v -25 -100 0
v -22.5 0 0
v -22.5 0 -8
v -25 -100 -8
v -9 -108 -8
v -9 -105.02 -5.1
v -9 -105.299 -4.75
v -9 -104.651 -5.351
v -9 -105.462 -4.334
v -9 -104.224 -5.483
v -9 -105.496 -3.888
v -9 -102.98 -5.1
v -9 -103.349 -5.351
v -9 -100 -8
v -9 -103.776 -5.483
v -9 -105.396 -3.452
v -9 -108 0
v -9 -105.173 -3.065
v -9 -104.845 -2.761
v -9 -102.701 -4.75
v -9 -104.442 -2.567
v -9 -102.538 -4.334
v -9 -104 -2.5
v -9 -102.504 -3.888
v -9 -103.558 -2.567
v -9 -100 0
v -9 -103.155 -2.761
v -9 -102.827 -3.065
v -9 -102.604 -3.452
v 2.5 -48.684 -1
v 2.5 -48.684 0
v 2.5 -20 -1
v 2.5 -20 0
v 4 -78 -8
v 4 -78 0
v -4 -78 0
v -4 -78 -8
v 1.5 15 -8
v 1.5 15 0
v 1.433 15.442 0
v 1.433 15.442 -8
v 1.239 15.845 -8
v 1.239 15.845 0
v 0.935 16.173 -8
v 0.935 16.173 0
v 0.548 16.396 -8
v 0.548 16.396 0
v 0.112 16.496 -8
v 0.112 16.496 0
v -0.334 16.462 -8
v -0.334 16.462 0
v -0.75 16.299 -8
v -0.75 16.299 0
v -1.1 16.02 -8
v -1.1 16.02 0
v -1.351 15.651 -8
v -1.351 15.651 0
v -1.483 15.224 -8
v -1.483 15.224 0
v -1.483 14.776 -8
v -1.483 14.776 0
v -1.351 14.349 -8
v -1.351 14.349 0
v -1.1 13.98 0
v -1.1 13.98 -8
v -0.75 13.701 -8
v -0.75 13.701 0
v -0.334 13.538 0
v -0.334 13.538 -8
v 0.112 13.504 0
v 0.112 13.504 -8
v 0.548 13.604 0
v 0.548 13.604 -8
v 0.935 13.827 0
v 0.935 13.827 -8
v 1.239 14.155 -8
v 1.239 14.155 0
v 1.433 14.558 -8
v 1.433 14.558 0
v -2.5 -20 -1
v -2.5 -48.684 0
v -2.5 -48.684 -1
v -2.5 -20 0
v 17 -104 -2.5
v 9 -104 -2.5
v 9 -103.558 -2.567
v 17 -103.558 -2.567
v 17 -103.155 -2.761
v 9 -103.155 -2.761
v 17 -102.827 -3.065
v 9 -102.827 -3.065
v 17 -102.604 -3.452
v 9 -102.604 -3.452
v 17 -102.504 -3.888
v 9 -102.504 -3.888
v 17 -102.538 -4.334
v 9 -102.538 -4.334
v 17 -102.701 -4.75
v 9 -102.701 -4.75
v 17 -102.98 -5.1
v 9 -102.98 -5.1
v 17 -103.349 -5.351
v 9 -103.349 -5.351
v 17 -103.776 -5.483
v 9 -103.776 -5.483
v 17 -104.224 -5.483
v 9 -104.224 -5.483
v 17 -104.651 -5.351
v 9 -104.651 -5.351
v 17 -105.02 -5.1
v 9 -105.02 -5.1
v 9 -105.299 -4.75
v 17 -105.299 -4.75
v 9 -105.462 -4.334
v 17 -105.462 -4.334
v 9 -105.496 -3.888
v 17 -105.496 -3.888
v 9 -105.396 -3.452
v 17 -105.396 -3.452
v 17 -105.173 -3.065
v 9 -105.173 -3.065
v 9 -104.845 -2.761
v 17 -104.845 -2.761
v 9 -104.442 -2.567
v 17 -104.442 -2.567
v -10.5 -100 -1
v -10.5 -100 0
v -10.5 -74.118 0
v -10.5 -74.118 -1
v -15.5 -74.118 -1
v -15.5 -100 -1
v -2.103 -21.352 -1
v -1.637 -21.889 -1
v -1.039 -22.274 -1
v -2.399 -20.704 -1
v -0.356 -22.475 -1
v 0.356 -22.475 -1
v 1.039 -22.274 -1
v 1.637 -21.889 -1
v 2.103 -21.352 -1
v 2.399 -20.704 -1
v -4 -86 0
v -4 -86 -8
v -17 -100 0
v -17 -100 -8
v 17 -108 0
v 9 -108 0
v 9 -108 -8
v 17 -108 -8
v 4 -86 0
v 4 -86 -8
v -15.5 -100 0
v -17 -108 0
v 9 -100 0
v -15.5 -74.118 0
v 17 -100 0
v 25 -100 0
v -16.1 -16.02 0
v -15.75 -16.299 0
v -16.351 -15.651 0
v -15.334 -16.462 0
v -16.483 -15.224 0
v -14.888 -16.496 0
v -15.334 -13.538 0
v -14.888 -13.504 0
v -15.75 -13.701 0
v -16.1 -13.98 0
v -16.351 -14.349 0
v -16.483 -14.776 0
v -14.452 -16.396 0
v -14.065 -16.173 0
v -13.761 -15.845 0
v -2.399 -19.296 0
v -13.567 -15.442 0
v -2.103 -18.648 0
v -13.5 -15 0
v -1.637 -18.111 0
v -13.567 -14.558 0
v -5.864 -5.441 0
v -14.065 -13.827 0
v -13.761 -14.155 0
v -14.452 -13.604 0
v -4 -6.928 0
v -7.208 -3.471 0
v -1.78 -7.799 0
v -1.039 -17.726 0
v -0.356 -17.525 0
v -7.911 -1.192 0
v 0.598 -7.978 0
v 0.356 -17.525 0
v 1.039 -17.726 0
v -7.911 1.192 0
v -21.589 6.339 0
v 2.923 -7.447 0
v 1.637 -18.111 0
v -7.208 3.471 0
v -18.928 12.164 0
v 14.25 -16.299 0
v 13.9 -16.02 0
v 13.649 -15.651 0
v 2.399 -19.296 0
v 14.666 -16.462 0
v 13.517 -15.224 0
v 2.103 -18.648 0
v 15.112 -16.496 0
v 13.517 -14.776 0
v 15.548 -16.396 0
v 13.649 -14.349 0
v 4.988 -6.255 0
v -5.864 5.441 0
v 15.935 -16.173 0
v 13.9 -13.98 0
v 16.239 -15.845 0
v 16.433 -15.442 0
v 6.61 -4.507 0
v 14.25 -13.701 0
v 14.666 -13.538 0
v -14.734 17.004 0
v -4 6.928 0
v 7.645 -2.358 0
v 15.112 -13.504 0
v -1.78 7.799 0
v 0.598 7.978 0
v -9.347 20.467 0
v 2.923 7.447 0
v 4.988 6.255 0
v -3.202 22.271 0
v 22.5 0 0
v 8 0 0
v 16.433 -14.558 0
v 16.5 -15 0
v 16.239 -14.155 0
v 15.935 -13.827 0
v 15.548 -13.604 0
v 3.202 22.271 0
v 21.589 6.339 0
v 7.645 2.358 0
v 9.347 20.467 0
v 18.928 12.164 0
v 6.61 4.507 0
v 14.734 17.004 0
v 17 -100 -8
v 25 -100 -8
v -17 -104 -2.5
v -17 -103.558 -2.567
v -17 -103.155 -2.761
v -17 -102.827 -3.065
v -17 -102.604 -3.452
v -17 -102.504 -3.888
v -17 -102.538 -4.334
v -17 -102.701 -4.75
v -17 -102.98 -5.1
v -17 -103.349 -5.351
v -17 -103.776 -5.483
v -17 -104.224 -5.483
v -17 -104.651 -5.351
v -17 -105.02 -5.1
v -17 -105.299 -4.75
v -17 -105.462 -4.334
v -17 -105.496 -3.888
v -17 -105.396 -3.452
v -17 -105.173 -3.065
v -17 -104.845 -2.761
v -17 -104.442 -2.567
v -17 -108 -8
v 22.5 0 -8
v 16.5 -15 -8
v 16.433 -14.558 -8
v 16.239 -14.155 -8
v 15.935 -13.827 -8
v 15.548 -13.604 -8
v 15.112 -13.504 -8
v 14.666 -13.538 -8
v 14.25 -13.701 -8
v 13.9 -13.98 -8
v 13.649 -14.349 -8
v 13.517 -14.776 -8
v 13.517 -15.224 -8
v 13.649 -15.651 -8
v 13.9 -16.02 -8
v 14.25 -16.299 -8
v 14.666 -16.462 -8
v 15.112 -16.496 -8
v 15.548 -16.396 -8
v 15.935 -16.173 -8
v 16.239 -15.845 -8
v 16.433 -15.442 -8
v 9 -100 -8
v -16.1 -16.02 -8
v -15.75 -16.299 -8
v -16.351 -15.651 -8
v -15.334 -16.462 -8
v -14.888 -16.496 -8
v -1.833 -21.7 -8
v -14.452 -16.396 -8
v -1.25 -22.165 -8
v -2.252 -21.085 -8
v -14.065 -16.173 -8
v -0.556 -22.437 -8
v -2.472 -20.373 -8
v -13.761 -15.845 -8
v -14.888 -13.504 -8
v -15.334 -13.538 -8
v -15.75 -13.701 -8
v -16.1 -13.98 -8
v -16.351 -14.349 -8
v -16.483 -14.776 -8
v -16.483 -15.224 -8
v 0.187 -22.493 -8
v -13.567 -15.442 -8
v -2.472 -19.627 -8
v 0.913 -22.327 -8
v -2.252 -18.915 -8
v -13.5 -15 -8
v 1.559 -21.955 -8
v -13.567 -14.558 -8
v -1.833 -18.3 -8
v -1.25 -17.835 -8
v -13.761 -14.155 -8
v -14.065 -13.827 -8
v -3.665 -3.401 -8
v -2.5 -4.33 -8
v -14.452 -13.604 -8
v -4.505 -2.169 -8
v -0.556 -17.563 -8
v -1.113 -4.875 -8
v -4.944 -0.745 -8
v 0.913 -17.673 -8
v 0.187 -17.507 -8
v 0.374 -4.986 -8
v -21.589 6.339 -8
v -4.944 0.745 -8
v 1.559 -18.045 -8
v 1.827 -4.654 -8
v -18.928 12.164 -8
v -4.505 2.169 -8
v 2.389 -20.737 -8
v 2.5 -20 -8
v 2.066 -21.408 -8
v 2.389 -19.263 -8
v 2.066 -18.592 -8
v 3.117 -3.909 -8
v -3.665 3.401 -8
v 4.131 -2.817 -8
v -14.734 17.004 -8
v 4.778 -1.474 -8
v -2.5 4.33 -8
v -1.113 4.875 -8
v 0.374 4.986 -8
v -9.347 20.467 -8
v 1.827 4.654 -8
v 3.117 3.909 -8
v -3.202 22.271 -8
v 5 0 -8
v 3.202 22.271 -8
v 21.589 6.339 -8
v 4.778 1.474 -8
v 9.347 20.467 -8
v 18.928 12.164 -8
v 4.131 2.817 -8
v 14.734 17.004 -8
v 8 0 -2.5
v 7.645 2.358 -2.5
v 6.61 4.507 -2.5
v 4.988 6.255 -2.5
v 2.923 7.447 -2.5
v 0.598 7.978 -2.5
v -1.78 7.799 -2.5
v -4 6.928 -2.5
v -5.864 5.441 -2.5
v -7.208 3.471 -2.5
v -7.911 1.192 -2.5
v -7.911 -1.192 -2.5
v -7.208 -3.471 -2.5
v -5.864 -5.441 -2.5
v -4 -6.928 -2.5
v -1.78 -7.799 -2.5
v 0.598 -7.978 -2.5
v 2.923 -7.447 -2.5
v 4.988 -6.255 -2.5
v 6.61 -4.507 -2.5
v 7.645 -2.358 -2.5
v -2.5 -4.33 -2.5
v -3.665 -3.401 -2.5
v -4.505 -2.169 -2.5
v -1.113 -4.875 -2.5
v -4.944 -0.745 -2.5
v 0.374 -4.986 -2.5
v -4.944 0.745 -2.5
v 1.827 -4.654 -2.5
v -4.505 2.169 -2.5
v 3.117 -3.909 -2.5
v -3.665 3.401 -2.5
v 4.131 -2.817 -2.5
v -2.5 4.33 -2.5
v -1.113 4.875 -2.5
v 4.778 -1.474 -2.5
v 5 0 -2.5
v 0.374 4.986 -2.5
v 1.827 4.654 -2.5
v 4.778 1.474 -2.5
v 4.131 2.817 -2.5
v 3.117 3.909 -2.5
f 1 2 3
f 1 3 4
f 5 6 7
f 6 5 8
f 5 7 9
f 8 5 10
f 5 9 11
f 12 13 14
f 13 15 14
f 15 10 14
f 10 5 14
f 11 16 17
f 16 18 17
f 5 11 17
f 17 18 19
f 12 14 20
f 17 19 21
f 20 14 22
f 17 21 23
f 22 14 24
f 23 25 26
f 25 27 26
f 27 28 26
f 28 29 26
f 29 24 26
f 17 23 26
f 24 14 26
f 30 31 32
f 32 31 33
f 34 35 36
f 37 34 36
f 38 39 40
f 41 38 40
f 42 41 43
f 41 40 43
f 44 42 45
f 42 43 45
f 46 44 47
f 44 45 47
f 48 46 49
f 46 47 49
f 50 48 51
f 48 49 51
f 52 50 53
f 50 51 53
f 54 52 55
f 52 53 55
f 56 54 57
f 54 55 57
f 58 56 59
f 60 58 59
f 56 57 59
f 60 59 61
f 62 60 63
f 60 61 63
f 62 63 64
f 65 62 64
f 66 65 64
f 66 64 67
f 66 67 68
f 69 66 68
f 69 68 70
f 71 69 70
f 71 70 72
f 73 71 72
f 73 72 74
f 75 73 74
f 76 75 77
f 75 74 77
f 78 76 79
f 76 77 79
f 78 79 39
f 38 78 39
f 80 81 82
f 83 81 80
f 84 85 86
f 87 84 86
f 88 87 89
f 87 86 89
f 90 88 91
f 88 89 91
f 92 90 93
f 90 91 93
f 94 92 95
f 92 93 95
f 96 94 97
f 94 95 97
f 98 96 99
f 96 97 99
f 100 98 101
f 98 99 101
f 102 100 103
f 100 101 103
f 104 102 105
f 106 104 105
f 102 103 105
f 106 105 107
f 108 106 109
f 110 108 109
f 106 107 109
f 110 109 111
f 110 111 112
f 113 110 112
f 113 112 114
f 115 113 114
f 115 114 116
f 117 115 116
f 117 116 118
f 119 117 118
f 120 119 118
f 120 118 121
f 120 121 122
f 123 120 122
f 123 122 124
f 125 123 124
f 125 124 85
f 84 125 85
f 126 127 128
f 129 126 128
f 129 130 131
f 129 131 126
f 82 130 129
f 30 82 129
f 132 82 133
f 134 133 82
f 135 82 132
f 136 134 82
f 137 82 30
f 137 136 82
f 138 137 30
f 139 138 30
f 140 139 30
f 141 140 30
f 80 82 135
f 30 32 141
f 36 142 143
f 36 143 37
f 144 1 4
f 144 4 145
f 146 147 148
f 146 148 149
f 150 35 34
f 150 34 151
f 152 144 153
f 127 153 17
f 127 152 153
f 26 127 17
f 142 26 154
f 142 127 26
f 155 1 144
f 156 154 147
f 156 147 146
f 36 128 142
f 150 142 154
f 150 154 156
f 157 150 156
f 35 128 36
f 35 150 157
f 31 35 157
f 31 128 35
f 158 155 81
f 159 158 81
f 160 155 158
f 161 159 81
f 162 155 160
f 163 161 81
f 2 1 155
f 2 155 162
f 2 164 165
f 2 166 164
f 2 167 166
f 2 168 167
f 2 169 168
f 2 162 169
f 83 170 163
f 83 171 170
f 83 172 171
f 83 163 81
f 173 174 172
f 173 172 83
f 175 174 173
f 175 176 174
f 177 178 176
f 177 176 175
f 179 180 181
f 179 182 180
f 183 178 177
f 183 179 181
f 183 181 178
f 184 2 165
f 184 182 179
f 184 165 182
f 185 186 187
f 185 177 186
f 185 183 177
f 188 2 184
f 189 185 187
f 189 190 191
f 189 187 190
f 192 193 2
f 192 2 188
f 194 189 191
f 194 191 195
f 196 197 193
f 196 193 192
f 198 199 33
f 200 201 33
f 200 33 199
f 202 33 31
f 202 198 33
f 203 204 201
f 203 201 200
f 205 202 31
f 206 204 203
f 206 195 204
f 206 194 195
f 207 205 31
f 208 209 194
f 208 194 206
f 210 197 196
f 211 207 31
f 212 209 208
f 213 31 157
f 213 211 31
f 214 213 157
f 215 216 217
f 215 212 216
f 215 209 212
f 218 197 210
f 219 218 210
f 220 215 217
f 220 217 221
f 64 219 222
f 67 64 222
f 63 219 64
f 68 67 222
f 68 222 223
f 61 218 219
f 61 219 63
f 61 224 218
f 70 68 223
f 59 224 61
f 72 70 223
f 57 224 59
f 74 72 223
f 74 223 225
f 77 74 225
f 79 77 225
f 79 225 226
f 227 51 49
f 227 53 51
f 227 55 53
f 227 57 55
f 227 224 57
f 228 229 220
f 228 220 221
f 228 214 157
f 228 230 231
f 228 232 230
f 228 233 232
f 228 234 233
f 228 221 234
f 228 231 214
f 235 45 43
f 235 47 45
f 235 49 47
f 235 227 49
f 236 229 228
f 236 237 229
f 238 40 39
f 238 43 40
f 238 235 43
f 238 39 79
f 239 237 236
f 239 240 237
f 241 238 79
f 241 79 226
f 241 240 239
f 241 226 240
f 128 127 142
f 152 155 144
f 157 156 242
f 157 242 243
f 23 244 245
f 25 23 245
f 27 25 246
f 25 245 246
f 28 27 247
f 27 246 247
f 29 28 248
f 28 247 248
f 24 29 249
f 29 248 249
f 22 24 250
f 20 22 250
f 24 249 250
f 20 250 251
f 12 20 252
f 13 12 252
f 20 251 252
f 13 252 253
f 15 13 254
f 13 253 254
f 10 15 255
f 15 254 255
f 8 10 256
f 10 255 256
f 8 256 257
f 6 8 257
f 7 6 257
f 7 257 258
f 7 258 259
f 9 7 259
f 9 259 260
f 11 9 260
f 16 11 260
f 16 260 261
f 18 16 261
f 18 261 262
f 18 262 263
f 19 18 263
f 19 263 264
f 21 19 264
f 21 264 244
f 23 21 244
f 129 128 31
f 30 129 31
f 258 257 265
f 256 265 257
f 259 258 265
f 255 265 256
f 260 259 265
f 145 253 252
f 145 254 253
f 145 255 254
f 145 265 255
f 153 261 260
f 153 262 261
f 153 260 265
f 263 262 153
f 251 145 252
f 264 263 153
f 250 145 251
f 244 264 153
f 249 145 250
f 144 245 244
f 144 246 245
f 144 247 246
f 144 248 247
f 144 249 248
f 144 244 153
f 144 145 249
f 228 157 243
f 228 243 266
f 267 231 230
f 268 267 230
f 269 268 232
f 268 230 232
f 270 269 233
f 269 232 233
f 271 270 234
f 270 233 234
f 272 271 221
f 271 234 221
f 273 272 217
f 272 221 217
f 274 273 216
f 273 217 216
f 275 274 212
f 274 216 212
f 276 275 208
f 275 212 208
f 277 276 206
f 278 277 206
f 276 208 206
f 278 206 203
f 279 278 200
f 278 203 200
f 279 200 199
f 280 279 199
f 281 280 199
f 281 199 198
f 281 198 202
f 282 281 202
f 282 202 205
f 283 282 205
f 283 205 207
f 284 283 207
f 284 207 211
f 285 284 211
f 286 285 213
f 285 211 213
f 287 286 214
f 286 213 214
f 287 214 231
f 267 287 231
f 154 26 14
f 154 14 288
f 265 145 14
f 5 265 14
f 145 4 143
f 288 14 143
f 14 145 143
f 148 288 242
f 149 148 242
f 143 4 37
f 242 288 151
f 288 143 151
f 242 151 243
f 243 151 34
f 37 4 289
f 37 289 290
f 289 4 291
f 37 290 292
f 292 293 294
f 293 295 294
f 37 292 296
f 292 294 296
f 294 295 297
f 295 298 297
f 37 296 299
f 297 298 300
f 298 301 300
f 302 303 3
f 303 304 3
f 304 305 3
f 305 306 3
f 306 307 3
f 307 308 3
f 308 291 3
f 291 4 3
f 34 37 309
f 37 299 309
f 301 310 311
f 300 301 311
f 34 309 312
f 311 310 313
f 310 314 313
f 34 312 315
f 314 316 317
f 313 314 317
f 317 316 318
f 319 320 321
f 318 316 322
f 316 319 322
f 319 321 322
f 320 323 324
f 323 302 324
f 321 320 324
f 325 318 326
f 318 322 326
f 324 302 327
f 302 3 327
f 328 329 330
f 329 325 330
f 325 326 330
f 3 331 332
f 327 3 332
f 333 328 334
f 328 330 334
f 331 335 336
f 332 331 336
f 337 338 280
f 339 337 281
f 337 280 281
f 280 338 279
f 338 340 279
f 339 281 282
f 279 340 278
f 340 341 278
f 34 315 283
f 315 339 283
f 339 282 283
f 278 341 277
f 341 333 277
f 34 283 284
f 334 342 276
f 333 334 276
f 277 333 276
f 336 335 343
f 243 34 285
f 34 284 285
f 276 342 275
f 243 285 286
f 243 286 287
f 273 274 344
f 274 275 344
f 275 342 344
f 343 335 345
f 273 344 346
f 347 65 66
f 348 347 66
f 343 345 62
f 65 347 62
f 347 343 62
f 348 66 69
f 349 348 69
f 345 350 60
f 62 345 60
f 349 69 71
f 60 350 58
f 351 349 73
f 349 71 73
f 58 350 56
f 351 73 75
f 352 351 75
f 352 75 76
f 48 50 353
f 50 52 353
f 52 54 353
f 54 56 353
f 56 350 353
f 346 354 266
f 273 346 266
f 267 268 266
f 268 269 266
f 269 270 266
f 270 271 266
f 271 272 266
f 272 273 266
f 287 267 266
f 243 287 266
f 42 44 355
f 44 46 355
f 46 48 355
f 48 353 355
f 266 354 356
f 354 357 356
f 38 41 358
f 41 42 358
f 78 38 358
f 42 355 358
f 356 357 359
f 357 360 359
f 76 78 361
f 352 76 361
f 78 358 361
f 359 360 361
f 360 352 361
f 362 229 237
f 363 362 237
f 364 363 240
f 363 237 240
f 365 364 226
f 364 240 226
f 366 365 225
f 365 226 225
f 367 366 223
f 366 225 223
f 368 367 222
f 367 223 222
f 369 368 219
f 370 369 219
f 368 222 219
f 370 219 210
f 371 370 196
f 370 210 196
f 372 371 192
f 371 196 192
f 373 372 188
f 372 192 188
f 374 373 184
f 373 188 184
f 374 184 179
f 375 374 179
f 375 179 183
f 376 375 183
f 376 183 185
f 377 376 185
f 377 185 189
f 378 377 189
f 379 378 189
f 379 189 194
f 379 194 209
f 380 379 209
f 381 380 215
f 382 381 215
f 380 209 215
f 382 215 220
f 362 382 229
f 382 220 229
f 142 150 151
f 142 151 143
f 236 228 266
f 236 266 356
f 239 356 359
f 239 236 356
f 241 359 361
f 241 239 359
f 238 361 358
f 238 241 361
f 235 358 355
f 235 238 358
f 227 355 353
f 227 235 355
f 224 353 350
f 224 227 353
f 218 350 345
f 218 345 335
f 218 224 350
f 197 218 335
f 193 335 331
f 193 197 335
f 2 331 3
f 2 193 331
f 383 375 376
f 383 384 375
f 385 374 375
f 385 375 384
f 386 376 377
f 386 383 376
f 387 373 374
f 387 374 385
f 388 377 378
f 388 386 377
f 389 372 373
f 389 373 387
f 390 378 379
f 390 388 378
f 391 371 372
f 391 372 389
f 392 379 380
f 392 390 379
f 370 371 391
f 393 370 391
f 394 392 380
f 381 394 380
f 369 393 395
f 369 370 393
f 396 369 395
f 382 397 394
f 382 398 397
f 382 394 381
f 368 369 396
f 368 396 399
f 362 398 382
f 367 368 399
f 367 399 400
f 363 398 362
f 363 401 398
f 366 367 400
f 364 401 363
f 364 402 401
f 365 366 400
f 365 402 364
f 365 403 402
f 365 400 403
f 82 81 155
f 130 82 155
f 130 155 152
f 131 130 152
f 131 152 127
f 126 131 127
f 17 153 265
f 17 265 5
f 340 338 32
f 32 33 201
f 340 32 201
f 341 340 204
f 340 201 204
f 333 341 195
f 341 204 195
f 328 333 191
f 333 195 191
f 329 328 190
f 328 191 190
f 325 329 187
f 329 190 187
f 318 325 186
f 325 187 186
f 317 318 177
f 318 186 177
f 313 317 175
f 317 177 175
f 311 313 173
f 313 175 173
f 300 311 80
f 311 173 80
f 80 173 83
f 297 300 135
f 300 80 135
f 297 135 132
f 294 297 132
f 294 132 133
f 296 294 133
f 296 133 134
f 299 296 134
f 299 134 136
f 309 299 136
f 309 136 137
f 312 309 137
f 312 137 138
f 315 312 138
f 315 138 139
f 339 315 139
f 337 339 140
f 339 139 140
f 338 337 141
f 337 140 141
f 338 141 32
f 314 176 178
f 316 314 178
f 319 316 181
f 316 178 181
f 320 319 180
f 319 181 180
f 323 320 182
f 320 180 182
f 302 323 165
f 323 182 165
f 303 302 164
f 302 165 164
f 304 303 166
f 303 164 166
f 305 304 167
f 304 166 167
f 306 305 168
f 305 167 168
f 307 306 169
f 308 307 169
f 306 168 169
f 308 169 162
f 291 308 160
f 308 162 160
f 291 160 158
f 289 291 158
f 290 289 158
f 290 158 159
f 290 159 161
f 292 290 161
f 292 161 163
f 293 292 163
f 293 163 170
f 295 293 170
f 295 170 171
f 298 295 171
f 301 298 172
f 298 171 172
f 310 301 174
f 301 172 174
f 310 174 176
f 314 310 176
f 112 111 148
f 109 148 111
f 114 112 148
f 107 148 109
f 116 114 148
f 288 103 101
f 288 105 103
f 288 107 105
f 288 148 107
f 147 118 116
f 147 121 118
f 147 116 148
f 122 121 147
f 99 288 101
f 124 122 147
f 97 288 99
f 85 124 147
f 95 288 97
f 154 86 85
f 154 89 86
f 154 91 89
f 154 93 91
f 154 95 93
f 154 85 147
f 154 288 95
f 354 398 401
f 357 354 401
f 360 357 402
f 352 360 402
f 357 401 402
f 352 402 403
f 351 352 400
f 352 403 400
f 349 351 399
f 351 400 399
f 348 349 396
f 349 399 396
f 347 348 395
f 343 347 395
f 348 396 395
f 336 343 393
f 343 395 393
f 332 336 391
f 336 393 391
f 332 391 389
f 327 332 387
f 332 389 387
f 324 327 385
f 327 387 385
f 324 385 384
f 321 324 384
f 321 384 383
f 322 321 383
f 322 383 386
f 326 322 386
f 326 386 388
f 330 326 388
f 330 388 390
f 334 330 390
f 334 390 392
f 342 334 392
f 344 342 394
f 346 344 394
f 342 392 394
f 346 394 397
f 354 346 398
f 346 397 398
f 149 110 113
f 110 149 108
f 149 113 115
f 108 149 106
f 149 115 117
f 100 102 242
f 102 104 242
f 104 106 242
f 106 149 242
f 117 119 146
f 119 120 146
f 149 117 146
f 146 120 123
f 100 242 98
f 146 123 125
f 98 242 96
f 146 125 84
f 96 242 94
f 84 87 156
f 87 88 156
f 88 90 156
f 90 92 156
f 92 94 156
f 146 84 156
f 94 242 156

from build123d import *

# Parameters (mm, degrees)
ARM_BOSS_EXTRUDE1_DEPTH                    = 8
SKETCH2_R                                  = 8
BEARING_CUT_EXTRUDE1_DEPTH                 = 2.5
SKETCH3_R                                  = 5
SHAFT_HOLE_CUT_EXTRUDE2_DEPTH              = 5.5
SKETCH4_R                                  = 2.5
CABLE_HOLE_CUT_EXTRUDE3_DEPTH              = 8
SKETCH5_W                                  = 8
SKETCH5_H                                  = 8
PUZZLE_SLOT_BOSS_EXTRUDE2_DEPTH            = 8
SKETCH6_W                                  = 5
SKETCH6_H                                  = 7.5
CABLE_CUT_EXTRUDE4_DEPTH                   = 1
SKETCH7_R                                  = 1.5
MOUNTING_HOLES_CUT_EXTRUDE5_DEPTH          = 8
PUZZLE_SLOT_SCREW_HOLES_CUT_EXTRUDE6_REACH = 118.155
SKETCH8_R                                  = 1.5
SIDE_PUZZLE_SLOT_CUT_EXTRUDE7_DEPTH        = 8
CABLE_LOWER_CUT_EXTRUDE8_DEPTH             = 1


with BuildPart() as part:
    # Sketch1 → Arm Boss-Extrude1 (new body)
    with BuildSketch(Plane.XY):
        with BuildLine():
            Line((-22.5, 0), (-25, -100))
            Line((-25, -100), (0, -100))
            Line((0, -100), (25, -100))
            Line((25, -100), (22.5, 0))
            ThreePointArc((22.5, 0), (0, 22.5), (-22.5, 0))
        make_face()
    extrude(amount=-ARM_BOSS_EXTRUDE1_DEPTH)

    # Sketch2 → Bearing Cut-Extrude1 (cut)
    with BuildSketch(Plane.XY):
        Circle(SKETCH2_R)
    extrude(amount=-BEARING_CUT_EXTRUDE1_DEPTH, mode=Mode.SUBTRACT)

    # Sketch3 → Shaft Hole Cut-Extrude2 (cut)
    with BuildSketch(Plane.XY.offset(-2.5)):
        Circle(SKETCH3_R)
    extrude(amount=-SHAFT_HOLE_CUT_EXTRUDE2_DEPTH, mode=Mode.SUBTRACT)

    # Sketch4 → Cable Hole Cut-Extrude3 (cut)
    with BuildSketch(Plane.XY):
        with Locations((0, -20)):
            Circle(SKETCH4_R)
    extrude(amount=-CABLE_HOLE_CUT_EXTRUDE3_DEPTH, mode=Mode.SUBTRACT)

    # Sketch5 → Puzzle Slot Boss-Extrude2 (add)
    with BuildSketch(Plane.XZ.offset(100)):
        with Locations((-13, -4)):
            Rectangle(SKETCH5_W, SKETCH5_H)
        with Locations((13, -4)):
            Rectangle(SKETCH5_W, SKETCH5_H)
    extrude(amount=PUZZLE_SLOT_BOSS_EXTRUDE2_DEPTH)

    # Sketch6 → Cable Cut-Extrude4 (cut)
    with BuildSketch(Plane.XY):
        with Locations((0, -23.75)):
            Rectangle(SKETCH6_W, SKETCH6_H)
    extrude(amount=-CABLE_CUT_EXTRUDE4_DEPTH, mode=Mode.SUBTRACT)

    # Sketch7 → Mounting Holes Cut-Extrude5 (cut)
    with BuildSketch(Plane.XY):
        with Locations((-15, -15)):
            Circle(SKETCH7_R)
        with Locations((15, -15)):
            Circle(SKETCH7_R)
        with Locations((0, 15)):
            Circle(SKETCH7_R)
    extrude(amount=-MOUNTING_HOLES_CUT_EXTRUDE5_DEPTH, mode=Mode.SUBTRACT)

    # Puzzle Slot Screw Holes Cut-Extrude6: up to this face of the body (flat: up to its plane)
    puzzle_slot_screw_holes_cut_extrude6_end = Plane(part.part.faces().sort_by_distance((17, -104, -4))[0])
    # Sketch8 → Puzzle Slot Screw Holes Cut-Extrude6 (cut, up to the picked face)
    with BuildSketch(Plane.ZY.offset(17), mode=Mode.PRIVATE) as puzzle_slot_screw_holes_cut_extrude6_sk1:
        with Locations((-4, -104)):
            Circle(SKETCH8_R)
    puzzle_slot_screw_holes_cut_extrude6_tool1 = split(extrude(puzzle_slot_screw_holes_cut_extrude6_sk1.sketch, amount=-PUZZLE_SLOT_SCREW_HOLES_CUT_EXTRUDE6_REACH, mode=Mode.PRIVATE), bisect_by=puzzle_slot_screw_holes_cut_extrude6_end, keep=Keep.BOTH, mode=Mode.PRIVATE)
    add(puzzle_slot_screw_holes_cut_extrude6_tool1.solids().sort_by(Axis((-17, -104, -4), (1, 0, 0)))[0], mode=Mode.SUBTRACT)

    # Sketch9 → Side Puzzle Slot Cut-Extrude7 (cut)
    with BuildSketch(Plane.XY):
        Polygon((-4, -78), (0, -78), (4, -78), (4, -86), (-4, -86), align=None)
    extrude(amount=-SIDE_PUZZLE_SLOT_CUT_EXTRUDE7_DEPTH, mode=Mode.SUBTRACT)

    # Sketch10 → Cable Lower Cut-Extrude8 (cut)
    with BuildSketch(Plane.XY):
        Polygon((-15.5, -100), (-10.5, -100), (-10.5, -74.117724453), (2.5, -48.683858805), (2.5, -27.5), (-2.5, -27.5), (-2.5, -48.683858805), (-15.5, -74.117724453), align=None)
    extrude(amount=-CABLE_LOWER_CUT_EXTRUDE8_DEPTH, mode=Mode.SUBTRACT)


solid = part.part
